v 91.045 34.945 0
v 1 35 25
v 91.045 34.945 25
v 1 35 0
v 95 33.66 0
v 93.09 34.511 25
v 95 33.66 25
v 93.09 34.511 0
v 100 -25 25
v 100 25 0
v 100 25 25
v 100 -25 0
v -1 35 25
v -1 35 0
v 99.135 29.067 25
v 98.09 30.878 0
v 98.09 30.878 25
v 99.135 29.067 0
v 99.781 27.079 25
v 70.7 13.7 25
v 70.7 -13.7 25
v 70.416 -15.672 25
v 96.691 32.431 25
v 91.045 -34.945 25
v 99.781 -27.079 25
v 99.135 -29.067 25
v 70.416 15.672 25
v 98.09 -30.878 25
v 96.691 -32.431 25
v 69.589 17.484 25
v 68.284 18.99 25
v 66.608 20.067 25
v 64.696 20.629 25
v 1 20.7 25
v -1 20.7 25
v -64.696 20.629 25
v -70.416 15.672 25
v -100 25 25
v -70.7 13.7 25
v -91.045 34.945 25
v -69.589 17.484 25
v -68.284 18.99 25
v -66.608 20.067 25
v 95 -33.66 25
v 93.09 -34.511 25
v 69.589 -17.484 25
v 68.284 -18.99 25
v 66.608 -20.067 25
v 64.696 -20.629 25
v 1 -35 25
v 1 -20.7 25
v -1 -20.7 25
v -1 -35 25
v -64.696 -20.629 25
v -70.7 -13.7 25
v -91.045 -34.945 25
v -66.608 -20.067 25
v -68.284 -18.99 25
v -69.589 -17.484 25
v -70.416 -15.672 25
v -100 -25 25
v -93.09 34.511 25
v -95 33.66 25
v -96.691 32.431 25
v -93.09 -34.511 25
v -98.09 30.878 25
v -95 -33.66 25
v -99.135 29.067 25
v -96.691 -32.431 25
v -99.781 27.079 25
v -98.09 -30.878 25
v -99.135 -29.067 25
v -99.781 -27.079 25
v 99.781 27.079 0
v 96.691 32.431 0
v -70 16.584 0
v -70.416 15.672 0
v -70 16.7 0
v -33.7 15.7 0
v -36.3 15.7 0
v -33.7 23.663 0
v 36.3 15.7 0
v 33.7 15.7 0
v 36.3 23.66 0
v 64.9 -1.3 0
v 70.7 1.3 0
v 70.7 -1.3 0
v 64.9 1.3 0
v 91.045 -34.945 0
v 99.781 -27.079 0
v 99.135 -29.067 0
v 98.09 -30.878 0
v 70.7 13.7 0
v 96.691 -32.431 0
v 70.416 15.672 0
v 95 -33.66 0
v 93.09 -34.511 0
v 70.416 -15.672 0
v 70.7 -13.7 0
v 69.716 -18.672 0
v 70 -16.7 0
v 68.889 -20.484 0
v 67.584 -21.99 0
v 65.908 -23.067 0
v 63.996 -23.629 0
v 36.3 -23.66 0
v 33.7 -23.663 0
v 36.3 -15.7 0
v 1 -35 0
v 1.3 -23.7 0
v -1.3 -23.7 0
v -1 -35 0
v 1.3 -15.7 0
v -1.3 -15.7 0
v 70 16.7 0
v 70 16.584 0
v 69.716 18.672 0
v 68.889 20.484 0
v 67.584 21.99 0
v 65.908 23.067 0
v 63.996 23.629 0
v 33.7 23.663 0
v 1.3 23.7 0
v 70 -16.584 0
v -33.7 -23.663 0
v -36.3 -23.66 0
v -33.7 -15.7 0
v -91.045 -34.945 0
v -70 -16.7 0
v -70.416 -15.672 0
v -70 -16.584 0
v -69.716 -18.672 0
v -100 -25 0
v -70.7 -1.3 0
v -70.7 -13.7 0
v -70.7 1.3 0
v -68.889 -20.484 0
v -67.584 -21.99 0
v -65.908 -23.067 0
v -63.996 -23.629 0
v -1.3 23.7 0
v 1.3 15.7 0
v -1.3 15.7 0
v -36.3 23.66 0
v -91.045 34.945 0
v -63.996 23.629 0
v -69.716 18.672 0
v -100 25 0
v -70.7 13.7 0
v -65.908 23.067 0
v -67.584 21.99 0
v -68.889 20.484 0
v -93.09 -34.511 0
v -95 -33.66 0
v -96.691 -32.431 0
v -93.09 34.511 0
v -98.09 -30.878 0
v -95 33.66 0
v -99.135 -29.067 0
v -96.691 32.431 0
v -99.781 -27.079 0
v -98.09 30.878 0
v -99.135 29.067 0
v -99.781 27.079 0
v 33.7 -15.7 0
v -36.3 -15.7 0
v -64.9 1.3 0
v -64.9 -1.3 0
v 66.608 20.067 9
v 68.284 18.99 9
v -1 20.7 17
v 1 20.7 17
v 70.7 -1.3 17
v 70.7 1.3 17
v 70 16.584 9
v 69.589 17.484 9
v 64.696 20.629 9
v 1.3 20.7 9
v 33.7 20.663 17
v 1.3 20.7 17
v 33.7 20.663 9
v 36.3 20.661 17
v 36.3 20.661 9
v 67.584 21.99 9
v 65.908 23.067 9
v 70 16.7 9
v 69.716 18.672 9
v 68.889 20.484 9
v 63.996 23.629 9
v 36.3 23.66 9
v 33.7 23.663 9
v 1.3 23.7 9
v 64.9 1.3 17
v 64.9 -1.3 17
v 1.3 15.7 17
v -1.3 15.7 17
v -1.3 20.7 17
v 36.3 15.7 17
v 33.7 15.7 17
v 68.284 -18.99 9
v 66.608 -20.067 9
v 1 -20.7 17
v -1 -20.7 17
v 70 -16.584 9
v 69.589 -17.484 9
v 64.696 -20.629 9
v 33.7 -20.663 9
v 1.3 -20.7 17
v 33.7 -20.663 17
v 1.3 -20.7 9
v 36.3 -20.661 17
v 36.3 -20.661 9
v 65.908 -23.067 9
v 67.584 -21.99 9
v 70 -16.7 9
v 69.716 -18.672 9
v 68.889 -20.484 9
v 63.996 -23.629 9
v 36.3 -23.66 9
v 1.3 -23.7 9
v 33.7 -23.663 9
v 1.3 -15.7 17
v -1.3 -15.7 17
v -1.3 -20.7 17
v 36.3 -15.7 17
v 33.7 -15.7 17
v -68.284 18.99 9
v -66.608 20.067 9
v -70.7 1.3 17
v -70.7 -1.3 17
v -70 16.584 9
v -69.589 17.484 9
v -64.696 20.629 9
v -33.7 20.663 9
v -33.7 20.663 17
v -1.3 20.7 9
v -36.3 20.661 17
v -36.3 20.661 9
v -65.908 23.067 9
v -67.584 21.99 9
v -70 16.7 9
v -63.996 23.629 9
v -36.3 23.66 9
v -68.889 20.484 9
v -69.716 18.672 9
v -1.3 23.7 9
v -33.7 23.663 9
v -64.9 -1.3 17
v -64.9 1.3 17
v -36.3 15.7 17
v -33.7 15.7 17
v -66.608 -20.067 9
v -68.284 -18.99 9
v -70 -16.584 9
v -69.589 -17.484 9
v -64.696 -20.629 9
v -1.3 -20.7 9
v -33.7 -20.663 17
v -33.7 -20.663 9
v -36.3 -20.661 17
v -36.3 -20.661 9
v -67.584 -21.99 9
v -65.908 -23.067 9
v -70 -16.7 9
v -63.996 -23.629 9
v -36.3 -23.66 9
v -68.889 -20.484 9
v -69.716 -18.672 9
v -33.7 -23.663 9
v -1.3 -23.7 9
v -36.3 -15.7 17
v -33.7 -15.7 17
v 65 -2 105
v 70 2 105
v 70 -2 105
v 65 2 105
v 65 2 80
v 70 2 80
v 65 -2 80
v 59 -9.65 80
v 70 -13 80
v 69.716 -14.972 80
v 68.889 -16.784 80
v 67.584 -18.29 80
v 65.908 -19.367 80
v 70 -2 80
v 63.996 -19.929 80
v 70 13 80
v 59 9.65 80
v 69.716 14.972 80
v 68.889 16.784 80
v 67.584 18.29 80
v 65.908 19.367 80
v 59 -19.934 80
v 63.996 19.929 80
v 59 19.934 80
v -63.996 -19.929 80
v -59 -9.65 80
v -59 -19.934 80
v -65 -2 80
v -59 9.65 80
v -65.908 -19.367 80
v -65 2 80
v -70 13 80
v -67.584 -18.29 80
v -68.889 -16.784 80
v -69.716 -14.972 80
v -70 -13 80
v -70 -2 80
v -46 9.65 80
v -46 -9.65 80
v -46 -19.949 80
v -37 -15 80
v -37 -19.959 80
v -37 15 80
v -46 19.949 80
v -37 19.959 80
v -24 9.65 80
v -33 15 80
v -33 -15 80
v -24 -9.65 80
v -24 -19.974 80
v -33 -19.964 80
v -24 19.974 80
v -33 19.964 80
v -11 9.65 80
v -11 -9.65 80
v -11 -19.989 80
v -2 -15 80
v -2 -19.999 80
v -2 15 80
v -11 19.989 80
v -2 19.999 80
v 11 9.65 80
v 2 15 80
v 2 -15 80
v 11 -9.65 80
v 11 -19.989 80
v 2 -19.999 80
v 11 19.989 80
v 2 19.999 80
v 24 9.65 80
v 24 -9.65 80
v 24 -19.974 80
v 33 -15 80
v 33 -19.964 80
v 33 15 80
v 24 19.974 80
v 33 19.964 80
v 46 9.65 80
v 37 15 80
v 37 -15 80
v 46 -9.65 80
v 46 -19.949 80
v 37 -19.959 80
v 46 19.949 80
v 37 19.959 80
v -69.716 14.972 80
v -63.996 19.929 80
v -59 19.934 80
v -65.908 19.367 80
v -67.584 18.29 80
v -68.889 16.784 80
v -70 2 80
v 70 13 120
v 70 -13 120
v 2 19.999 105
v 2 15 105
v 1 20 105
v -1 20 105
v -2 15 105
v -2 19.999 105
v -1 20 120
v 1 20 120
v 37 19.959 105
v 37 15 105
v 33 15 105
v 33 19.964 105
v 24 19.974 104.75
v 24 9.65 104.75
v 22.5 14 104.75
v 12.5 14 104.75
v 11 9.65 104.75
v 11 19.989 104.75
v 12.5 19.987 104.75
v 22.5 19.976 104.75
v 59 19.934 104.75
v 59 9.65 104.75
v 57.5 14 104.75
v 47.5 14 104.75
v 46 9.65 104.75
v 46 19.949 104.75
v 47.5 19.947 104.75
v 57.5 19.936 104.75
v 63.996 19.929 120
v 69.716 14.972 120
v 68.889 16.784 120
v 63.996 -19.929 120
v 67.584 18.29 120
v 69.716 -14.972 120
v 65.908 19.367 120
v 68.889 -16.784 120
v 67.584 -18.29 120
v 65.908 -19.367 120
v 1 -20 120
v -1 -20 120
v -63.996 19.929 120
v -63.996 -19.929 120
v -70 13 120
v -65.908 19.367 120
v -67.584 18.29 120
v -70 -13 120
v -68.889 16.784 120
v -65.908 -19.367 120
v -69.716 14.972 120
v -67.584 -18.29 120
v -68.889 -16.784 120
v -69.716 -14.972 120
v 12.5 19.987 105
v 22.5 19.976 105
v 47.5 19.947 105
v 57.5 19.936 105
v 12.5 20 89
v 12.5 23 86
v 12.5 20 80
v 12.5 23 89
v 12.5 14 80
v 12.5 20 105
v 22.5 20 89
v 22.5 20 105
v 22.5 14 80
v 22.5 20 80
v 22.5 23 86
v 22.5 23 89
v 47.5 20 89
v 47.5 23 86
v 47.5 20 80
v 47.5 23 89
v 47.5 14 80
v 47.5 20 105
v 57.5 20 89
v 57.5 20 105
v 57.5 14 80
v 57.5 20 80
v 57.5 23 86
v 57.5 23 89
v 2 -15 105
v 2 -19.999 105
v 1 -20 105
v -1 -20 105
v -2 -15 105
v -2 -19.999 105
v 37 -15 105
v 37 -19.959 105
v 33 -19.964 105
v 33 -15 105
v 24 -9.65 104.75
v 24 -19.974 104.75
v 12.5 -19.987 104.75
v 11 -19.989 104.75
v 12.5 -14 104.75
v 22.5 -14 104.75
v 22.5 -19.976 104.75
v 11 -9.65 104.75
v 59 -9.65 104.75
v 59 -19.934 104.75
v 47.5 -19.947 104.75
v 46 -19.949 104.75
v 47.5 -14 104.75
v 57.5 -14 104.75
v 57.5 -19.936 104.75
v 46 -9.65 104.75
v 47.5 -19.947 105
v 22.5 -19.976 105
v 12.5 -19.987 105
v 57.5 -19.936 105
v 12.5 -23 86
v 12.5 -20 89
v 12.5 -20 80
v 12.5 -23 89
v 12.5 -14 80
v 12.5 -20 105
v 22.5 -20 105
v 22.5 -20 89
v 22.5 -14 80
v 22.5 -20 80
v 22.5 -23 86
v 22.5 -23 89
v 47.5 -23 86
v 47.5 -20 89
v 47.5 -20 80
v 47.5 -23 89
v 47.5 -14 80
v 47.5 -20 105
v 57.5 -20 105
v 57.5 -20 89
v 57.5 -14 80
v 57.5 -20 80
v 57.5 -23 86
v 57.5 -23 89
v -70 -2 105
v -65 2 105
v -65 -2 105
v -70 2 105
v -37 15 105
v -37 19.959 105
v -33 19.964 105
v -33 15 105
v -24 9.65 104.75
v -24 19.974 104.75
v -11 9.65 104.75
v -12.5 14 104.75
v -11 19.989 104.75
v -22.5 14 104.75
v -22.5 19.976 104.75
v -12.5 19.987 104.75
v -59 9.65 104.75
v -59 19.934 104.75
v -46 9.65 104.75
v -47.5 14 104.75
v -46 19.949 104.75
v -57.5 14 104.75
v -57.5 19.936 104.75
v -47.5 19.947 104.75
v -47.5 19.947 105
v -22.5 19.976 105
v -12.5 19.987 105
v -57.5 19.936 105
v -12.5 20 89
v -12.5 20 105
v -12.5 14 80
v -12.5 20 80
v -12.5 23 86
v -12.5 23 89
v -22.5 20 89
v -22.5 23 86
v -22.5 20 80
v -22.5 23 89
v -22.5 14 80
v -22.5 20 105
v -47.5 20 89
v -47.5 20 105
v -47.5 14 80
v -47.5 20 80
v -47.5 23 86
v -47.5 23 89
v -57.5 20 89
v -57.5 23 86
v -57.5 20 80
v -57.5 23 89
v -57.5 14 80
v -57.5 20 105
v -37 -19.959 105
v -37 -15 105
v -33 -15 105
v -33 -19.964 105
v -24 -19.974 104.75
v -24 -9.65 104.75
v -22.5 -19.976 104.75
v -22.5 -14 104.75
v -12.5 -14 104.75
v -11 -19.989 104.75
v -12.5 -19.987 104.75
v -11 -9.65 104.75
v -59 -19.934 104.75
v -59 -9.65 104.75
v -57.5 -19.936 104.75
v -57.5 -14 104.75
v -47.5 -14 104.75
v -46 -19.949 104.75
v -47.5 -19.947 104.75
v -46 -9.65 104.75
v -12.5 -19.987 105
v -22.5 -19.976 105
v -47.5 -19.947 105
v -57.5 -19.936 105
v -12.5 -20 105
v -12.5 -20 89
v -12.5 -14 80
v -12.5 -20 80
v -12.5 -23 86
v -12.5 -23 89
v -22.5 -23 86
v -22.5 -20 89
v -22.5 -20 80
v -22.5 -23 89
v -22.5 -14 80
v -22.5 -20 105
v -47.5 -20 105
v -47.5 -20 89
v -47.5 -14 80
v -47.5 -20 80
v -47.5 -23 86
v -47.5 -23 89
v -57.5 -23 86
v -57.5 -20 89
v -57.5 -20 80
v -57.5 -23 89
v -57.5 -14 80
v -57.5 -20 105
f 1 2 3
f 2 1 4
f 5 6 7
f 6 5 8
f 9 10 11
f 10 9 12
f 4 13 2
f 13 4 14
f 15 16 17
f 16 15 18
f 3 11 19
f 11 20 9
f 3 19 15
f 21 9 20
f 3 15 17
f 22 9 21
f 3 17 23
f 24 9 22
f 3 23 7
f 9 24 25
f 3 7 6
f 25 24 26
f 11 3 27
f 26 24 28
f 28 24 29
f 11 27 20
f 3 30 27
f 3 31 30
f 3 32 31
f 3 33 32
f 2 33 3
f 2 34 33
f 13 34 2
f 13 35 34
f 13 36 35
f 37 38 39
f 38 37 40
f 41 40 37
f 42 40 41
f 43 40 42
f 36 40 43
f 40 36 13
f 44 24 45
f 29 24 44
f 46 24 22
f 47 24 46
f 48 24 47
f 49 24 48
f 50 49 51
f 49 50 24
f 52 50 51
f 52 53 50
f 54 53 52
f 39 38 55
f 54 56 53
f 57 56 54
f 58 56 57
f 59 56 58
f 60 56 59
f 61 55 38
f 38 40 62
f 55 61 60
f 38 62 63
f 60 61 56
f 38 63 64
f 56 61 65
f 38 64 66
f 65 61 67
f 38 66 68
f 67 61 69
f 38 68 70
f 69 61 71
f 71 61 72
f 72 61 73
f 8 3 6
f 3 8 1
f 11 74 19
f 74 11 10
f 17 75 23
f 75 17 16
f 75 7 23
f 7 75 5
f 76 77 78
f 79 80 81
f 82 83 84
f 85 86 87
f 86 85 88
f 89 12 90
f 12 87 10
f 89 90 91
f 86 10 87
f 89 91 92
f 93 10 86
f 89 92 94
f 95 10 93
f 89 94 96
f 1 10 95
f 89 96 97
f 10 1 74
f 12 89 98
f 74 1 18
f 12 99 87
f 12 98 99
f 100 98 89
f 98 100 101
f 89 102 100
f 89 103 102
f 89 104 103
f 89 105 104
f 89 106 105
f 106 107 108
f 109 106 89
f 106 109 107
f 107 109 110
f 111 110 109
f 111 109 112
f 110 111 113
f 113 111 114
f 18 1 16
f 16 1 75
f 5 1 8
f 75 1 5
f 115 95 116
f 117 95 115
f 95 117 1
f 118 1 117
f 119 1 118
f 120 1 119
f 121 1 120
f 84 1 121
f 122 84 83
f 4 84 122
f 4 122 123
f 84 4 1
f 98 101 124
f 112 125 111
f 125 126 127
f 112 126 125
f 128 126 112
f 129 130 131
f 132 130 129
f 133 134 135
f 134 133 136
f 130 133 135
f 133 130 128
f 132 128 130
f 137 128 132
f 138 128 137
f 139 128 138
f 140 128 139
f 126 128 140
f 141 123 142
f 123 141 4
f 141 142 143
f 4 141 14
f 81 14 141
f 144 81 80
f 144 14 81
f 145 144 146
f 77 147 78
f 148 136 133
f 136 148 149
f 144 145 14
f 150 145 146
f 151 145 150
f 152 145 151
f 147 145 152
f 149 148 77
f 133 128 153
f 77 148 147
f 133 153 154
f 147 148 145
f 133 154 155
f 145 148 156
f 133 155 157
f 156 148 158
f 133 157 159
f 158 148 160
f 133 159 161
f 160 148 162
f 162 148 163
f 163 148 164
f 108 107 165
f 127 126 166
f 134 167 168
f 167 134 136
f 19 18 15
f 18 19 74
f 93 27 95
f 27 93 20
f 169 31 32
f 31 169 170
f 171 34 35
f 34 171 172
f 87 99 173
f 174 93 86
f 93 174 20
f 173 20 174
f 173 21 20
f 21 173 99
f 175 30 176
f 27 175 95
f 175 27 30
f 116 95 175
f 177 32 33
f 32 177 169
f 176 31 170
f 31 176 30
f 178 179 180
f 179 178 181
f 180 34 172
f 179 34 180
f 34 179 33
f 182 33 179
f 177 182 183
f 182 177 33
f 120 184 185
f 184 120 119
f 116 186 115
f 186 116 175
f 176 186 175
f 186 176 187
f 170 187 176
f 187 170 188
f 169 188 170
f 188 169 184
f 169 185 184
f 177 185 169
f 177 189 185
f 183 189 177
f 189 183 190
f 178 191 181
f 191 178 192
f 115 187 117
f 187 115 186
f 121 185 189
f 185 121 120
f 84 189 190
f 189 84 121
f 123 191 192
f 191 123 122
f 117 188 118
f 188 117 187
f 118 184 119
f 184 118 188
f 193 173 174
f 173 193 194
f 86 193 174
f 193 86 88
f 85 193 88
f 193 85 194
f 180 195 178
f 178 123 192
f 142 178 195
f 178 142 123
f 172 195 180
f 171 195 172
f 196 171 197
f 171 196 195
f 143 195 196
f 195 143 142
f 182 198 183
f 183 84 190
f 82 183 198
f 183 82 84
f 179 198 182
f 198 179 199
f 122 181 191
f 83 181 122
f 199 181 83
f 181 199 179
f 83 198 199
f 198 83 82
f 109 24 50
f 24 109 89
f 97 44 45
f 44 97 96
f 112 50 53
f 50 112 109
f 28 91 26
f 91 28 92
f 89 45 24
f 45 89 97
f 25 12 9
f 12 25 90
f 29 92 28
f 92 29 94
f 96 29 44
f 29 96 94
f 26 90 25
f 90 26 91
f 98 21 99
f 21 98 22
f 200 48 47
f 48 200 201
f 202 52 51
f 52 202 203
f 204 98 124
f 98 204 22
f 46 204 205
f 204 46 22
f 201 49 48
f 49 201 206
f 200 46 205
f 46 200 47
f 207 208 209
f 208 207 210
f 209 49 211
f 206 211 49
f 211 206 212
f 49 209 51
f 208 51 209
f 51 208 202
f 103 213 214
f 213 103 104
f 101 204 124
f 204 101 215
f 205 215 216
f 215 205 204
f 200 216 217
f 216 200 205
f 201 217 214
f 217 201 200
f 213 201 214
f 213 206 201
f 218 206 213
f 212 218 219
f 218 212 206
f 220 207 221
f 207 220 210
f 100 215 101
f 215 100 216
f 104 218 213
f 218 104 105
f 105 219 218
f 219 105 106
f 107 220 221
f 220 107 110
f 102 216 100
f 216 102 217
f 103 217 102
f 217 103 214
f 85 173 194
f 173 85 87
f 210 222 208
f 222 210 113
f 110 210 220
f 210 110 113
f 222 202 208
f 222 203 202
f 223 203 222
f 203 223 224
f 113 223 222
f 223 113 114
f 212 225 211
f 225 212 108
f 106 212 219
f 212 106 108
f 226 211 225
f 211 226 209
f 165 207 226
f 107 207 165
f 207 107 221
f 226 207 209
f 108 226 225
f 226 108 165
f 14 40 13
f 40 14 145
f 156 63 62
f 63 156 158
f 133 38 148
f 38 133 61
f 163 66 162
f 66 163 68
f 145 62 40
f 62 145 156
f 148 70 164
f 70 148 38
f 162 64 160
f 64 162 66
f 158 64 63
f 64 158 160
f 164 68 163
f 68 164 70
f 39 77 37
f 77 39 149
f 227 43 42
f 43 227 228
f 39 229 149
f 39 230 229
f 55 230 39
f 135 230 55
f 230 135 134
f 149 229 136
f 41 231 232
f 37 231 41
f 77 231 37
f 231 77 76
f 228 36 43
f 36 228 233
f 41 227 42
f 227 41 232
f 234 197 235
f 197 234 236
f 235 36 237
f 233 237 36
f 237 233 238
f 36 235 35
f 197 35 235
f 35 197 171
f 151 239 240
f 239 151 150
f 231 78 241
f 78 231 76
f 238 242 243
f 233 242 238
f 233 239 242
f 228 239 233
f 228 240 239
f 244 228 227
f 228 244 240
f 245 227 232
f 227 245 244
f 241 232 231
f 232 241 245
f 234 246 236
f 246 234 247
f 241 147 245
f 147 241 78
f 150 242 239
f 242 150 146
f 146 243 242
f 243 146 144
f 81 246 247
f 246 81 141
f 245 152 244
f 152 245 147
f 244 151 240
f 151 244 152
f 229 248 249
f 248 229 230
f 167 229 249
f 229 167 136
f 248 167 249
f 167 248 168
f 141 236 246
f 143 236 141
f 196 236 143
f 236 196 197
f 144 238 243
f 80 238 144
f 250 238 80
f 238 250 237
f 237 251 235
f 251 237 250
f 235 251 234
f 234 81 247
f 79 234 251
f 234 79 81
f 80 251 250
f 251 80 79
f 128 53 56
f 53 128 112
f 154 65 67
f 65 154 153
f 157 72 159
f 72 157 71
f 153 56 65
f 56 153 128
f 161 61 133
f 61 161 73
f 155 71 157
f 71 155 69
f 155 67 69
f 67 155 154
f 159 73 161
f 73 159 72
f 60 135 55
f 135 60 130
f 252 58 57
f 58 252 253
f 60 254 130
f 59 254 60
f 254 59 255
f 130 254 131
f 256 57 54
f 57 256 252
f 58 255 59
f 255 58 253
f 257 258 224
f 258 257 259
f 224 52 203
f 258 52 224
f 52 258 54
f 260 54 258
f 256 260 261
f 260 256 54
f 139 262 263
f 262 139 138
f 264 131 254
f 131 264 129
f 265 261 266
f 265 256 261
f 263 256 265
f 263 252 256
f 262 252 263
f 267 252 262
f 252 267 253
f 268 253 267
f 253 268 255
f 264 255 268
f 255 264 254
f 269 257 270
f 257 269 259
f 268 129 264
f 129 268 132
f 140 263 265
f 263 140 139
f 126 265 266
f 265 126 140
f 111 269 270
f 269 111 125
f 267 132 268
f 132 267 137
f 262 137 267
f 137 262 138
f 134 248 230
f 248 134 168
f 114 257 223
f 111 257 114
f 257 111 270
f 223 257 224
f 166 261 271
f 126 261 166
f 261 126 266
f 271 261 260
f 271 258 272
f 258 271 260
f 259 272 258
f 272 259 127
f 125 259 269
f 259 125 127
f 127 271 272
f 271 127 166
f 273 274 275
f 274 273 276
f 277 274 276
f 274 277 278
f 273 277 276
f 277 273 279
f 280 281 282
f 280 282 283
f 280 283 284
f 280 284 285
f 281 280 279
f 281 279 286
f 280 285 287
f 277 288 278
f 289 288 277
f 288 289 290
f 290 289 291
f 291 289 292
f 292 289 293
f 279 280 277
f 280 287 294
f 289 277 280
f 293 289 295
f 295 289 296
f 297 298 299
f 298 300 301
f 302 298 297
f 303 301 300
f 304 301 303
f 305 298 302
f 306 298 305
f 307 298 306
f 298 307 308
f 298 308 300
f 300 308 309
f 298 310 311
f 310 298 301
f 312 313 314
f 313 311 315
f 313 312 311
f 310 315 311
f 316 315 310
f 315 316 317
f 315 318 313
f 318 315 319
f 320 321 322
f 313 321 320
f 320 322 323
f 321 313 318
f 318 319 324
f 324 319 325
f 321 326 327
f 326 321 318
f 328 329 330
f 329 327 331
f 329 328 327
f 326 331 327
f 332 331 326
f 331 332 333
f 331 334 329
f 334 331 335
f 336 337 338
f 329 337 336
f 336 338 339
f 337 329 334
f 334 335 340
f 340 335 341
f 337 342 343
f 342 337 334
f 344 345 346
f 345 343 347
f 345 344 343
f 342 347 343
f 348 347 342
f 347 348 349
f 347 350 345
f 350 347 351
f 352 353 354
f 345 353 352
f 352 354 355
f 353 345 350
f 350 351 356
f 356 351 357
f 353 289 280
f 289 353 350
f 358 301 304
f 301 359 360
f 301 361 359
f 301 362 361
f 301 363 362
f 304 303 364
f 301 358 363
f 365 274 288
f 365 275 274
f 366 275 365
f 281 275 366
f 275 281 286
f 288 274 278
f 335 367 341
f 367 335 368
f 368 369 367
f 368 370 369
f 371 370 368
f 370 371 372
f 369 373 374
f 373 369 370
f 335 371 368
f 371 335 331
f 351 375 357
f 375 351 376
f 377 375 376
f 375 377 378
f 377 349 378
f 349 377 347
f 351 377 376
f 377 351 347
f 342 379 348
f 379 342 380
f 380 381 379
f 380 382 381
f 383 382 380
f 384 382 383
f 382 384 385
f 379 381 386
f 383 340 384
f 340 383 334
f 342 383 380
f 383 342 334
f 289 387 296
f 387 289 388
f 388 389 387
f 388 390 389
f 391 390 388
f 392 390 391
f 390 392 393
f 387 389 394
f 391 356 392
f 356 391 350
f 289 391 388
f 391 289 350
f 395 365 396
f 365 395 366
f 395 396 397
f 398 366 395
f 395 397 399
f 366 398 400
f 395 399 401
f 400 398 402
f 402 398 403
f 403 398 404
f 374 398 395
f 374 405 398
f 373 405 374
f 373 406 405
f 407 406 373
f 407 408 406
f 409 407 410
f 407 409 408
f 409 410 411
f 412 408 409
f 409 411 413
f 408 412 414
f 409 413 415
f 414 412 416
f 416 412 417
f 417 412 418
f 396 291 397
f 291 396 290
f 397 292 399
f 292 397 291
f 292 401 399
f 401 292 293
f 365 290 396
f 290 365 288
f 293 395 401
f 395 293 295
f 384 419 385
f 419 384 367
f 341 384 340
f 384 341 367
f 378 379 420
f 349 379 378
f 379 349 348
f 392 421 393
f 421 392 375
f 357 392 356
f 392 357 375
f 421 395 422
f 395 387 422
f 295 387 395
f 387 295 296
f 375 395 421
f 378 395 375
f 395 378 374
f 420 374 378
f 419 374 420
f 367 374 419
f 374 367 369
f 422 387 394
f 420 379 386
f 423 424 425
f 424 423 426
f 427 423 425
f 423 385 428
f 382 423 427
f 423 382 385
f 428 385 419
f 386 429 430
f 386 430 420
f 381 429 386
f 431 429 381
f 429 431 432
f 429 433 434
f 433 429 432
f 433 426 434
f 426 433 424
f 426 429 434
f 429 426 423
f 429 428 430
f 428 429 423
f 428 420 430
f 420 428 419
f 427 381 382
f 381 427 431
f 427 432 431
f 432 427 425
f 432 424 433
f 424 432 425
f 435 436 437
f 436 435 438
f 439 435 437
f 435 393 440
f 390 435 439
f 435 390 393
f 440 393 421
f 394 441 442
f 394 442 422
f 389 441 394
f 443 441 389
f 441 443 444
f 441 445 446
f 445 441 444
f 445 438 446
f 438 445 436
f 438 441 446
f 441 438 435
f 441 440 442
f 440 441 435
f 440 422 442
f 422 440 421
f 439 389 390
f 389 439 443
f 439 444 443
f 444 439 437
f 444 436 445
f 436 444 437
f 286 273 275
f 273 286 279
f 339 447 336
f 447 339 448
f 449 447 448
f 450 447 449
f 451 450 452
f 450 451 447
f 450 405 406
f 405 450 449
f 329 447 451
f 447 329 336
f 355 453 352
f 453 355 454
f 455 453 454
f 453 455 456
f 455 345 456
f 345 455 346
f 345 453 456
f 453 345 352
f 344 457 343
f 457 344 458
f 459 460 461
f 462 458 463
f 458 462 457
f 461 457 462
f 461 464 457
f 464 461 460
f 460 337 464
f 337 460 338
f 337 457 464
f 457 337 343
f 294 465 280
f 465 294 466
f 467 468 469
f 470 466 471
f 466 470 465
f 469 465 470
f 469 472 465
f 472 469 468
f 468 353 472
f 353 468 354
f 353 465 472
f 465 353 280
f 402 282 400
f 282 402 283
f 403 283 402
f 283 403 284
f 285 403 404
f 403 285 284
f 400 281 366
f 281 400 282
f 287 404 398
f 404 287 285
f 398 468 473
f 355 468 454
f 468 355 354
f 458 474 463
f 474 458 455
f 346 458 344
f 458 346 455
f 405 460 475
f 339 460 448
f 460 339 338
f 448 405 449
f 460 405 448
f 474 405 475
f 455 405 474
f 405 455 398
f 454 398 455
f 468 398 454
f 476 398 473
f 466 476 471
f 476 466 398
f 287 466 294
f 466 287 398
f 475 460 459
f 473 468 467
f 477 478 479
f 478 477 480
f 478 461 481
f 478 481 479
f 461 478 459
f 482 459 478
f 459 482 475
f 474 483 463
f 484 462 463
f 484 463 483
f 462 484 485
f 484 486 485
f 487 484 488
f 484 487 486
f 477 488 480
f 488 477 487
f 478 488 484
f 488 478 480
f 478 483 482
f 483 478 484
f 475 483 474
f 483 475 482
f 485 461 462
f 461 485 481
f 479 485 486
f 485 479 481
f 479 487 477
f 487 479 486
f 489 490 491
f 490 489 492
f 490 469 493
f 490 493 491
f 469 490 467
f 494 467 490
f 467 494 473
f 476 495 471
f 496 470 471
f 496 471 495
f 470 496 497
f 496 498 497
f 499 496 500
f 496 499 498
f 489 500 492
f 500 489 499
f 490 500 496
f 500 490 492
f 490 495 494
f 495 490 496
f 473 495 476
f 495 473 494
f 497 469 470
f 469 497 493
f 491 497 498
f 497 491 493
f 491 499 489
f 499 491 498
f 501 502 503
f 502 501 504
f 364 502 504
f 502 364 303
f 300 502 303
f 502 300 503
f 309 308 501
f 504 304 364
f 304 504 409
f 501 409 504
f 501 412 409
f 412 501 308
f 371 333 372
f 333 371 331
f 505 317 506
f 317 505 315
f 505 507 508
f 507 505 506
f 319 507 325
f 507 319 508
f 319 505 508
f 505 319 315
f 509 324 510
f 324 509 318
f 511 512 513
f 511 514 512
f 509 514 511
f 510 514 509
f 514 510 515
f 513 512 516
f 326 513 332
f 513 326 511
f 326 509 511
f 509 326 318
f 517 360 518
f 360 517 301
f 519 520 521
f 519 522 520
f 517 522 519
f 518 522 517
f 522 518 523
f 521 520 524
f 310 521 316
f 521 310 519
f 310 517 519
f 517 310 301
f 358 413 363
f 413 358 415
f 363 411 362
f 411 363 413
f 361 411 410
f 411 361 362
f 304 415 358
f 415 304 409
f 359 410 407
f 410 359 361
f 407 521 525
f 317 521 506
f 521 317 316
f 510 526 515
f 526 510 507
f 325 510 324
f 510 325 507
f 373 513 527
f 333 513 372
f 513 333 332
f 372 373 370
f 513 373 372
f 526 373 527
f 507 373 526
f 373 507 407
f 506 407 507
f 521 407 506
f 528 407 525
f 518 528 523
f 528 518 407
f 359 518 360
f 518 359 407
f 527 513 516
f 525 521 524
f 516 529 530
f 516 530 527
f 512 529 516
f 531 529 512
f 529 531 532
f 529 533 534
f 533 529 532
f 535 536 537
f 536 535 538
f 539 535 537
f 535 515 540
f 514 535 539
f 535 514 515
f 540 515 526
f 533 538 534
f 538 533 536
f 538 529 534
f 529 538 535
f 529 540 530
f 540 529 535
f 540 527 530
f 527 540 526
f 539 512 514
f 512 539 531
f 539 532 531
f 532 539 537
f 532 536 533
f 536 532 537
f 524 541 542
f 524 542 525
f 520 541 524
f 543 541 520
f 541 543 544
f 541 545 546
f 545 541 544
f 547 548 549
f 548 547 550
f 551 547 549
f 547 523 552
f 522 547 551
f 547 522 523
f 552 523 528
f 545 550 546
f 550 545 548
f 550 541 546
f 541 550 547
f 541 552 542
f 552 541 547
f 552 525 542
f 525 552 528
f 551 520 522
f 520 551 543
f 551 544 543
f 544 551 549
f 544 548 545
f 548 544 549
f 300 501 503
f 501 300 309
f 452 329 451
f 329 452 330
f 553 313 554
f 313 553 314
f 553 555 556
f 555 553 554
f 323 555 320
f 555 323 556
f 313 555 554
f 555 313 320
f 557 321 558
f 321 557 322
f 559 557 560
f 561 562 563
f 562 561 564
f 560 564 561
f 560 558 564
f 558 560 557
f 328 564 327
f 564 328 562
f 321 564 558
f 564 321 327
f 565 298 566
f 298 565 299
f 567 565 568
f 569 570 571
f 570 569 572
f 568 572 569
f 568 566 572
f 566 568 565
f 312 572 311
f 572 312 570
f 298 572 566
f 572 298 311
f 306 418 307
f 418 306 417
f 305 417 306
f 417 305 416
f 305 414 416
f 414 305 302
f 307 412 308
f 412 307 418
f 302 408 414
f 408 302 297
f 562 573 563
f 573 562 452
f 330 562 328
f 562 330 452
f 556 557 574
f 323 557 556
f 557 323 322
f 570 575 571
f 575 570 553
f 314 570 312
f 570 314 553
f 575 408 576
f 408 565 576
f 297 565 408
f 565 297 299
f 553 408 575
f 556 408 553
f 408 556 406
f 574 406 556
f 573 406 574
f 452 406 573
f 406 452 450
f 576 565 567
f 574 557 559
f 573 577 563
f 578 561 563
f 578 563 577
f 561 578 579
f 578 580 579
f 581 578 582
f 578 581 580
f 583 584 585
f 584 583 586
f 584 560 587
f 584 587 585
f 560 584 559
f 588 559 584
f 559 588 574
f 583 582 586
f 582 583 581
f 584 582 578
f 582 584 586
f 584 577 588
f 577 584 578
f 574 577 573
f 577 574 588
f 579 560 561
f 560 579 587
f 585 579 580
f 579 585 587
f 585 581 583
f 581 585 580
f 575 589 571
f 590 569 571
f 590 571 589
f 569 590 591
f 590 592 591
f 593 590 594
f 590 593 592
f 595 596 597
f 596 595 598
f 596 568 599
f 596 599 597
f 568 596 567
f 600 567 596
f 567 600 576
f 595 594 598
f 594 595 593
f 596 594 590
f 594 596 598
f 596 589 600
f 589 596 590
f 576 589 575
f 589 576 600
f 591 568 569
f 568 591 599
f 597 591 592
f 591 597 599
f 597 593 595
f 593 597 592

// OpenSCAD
// Brian Button V 0.91
// Copyright 2018 Brian Palmer
// http://www.thingiverse.com/thing:3237565
// V 0.90 first release. basic button and bezel are customizable.
// V 0.91 - Fixed a bunch of things including button travel
// V 0.92 - Fixed print mode to correctly flip parts upside down. Tweaked default slide and clip parameter values. Added some airspace equal to bezelButtonClearance around clip lip ledge.

// Released under Creative Commons Attribution-NonCommercial-ShareAlike 4.0
// https://creativecommons.org/licenses/by-nc-sa/4.0/

/* [General Parameters] */

//Choose which part to create.  Best practice is to set all settings, and then generate each part, one by one.  
part = "both"; //[ bezel:Button Bezel, button:Button, both:Button and Bezel]  

/* [Preview Settings] */

//Enable to preview all parts together!  KEEP THIS OFF in order to create individual printable parts.
preview = 1;//[0:Print,1:Preview] 
//Explode parts apart to see them individually better.  Only relevant when previewing.
explodedView = 1; //[0:Normal,1:Exploded] 

/* [Bezel] */
// The bezel of course should be longer and wider than the button itself.
bezelLength=200; 
bezelWidth=70;
bezelHeight=25;
bezelCornerRadious=10;
// Amount of air space between the button and the bezel.
bezelButtonClearance=.7; 

/* [Button] */
buttonLength=140;
buttonWidth=40;
buttonHeight=40;
buttonRadious=7;
// The amount the button can travel before hitting the slide stops.
buttonMaxPushDistance=8;

/* [Button Clips] */
// Clips need to flex a little during install button into the bezel. 
// 0 = no clips
// width of 4 button clips. Should be less than button height.
clipWidth=10;
// thickness of clip leg. Keep this thin so it can flex a little during assembly. 
clipDepth=6;
// length of clip leg. the longer the more flexible the clip.
clipHeight=25;
// This is amount of air space between clip and button side
clipButtonClearance=1.5;
// length of clip foot. Keeps button from popping out of bezel. Should be greater than clipButtonClearance.
clipOverhang=3; 

/* [Slides] */
// 0 = no slide
slideWidth=4;
slideDepth=5; 

/* [Hidden] */
// some parameter validation/limiting
bezelR = (bezelCornerRadious > bezelWidth/2) ? bezelWidth/2 : bezelCornerRadious;
echo ("bezelCornerRadious:", bezelCornerRadious);
qtrBezelDim=[bezelLength/2, bezelWidth/2, bezelHeight];
btnRadious = (buttonRadious > buttonWidth/2) ? buttonWidth/2 : buttonRadious;
echo ("btnRadious:", btnRadious);
// todo: add more validation

qtrBtnDim=[buttonLength/2, buttonWidth/2, buttonHeight]; 
slideCutout=[slideWidth, slideDepth, bezelHeight];
clipCutout=[clipWidth+(clipButtonClearance*2), clipDepth+clipOverhang*1.45, clipHeight - .25];
clipLeg=[clipWidth, clipDepth, clipHeight];
// generate some shortcuts for the 3 evenly spaced work positions
OneEigthbuttonLength = buttonLength/8;
xPosition1 = OneEigthbuttonLength;
xPosition2 = OneEigthbuttonLength * 2;
xPosition3 = OneEigthbuttonLength * 3;

// do it!
main();

module main(){
	
    if(preview==1) { // only supports viewing both parts
        createBezel();
        if (explodedView==1) 
            translate([0,0, buttonHeight+40]) createButton();
        else
            createButton();
    } else { // print mode flips parts upside down and spaces them out when both are being printed.
        
        if (part=="button") {
            translate([0,0,buttonHeight]) rotate([180,0,0]) createButton();
        } else {
            translate([0,buttonWidth+120,+bezelHeight]) rotate([180,0,0]) createBezel();
            if (part=="both") {
               translate([0,0,buttonHeight]) rotate([180,0,0]) createButton();
            }
        }
    }
}

module createBezel() {
    // create upper right 1/4 of the bezel
    qtrBezel(qtrBezelDim, bezelCornerRadious);
    // create lower right q of the button. colors are for debugging only
    mirror([0,1,0]) qtrBezel(qtrBezelDim, bezelCornerRadious); 
    // upper left 1/4 of the button
    // color("Green",0.5) 
    mirror([1,0,0]) qtrBezel(qtrBezelDim, bezelCornerRadious); 
    // lower left 1/4 of the button
    // color("Purple",0.5)
    mirror([1,0,0]) mirror([0,1,0]) qtrBezel(qtrBezelDim, bezelCornerRadious); 
}
module createButton() {
    // create upper right 1/4 of the button
    qtrBtn(qtrBtnDim, btnRadious); 

    // create lower right 1/4 of the button
    //c olor("Blue",0.5) 
    mirror([0,1,0]) qtrBtn(qtrBtnDim, btnRadious); 
    // upper left 1/4 of the button
    // color("Green",0.5) 
    mirror([1,0,0]) qtrBtn(qtrBtnDim, btnRadious); 
    // lower left 1/4 of the button
    // color("Purple",0.5) 
    mirror([1,0,0]) mirror([0,1,0]) qtrBtn(qtrBtnDim, btnRadious);     
}

module qtrBtn(qtrBtnDim, btnRadious) {

    difference() {        
        qtrCube(qtrBtnDim, btnRadious);
        
        if (slideWidth > 0)
        {
            // Y side slide cutout
            translate([qtrBtnDim.x,-(slideCutout.x/2),0]) rotate([0,0,90]) cube(slideCutout, center=false);
            // 1st  x slide cutout (only half of X is needed)
            translate([-(slideCutout.x/2),qtrBtnDim.y-slideCutout.y,0]) cube(slideCutout, center=false);
            // 2nd X slide cutout
            translate([xPosition2-(slideCutout.x/2),qtrBtnDim.y-slideCutout.y,0]) cube(slideCutout, center=false);
        }
        
        if (clipWidth > 0)
        {
            // 1st clip cutout
            translate([xPosition1-(clipCutout.x/2),qtrBtnDim.y-clipCutout.y,0]) cube(clipCutout, center=false);
            // 2nd clip cutout
            translate([xPosition3-(clipCutout.x/2),qtrBtnDim.y-clipCutout.y,0]) cube(clipCutout, center=false);
        }
    }
    
    // 1st clip leg 
    translate([xPosition1,qtrBtnDim.y-clipLeg.y,0]) makeclip(clipLeg, clipOverhang);        
   // 2nd clip leg 
    translate([xPosition3,qtrBtnDim.y-clipLeg.y,0]) makeclip(clipLeg, clipOverhang);    
    
}

module qtrBezel(qtrBezelDim, bezelCornerRadious) {
   
    difference() {
        difference() {
            //  outer edge of bezel
            qtrCube(qtrBezelDim, bezelCornerRadious);
            // use button dims and bezel height to create a slightly larger button hole
            qtrCube(3dOffset(qtrBtnDim,[bezelButtonClearance, bezelButtonClearance,-(qtrBtnDim.z) + qtrBezelDim.z]), btnRadious);
        }
        if (clipWidth > 0)
        {
            // use button dims to create clip stop ledge. hardcoded t0 be 1.5 times the clipDepth.
            qtrCube(3dOffset(qtrBtnDim,[0,clipOverhang+bezelButtonClearance,-qtrBtnDim.z + (clipDepth * 1.5)]), btnRadious);
        }
    }
 
    // button slides built into bezel
    if (slideWidth > 0)
    {
        // Y side slide 
        halfSizeSlideDim = 3dOffset(slideCutout,[-((slideCutout.x/2)+bezelButtonClearance),clipOverhang+(bezelButtonClearance*3),-buttonMaxPushDistance]);
        translate([qtrBtnDim.x+slideCutout.y,0,0]) rotate([0,0,90]) cube(halfSizeSlideDim, center=false);

        // 1st x slide (only half of X is needed)
        translate([0,qtrBtnDim.y+bezelButtonClearance-slideCutout.y,0]) cube(halfSizeSlideDim, center=false);

        // 2nd X slide
        xSlideDim = 3dOffset(slideCutout,[-(bezelButtonClearance*2),clipOverhang,-buttonMaxPushDistance]);
        translate([xPosition2-(slideCutout.x/2)+bezelButtonClearance,qtrBtnDim.y-slideCutout.y+bezelButtonClearance,0]) cube(xSlideDim, center=false);
    }
    
    echo ("x:", 3dOffset(qtrBtnDim,[clipOverhang,clipOverhang,0]).x,
          "y:", 3dOffset(qtrBtnDim,[clipOverhang,clipOverhang,0]).y,
          "z:", 3dOffset(qtrBtnDim,[clipOverhang,clipOverhang,(qtrBtnDim.z*-1) + 7.5]).z);
}

module qtrCube(cubeDim, cornerRadious) {
    // main button cube - if no radious specified, just use with a simple cube
    if (cornerRadious <= 0) {
        cube(cubeDim, center=false);
    } else { // radiused corners requires hulling 3 cubes and 1 cylinder
        hull() {
            // 3 square corners
            cube([1,1,cubeDim.z], center=false);
            translate([cubeDim.x-1, 0, 0]) cube([1,1,cubeDim.z], center=false);
            translate([0, cubeDim.y-1, 0]) cube([1,1,cubeDim.z], center=false);
            // radius the far corner
            translate([cubeDim.x-cornerRadious,cubeDim.y-cornerRadious,0]) cylinder(r=cornerRadious,h=cubeDim.z);
        }
    }
}

function 3dOffset(orig, modifier) = [orig.x + modifier.x, orig.y + modifier.y, orig.z + modifier.z];

/// returns a rectangle with a beveled hook on the end
module makeclip(c, hookSize) {
clip =[
    [0,0],                      //1
    [0,c.z],                    //2
    [c.y,c.z],                  //3
    [c.y,c.y*1.5],              //4 note multiplier of 1.5 hardcoded vert in the foot tip
    [c.y+hookSize,c.y*1.5],     //5
    [c.y+hookSize,c.y],         //6
    [c.y,0]                     //7
    ];
        
    rotate([0,90,0]) rotate([0,0,90]) linear_extrude(height = c.x, center = true, convexity = 10, twist = 0, slices = 1, scale = 1.0, $fn = 16) 
    {
        polygon(clip);
    }
  
}
